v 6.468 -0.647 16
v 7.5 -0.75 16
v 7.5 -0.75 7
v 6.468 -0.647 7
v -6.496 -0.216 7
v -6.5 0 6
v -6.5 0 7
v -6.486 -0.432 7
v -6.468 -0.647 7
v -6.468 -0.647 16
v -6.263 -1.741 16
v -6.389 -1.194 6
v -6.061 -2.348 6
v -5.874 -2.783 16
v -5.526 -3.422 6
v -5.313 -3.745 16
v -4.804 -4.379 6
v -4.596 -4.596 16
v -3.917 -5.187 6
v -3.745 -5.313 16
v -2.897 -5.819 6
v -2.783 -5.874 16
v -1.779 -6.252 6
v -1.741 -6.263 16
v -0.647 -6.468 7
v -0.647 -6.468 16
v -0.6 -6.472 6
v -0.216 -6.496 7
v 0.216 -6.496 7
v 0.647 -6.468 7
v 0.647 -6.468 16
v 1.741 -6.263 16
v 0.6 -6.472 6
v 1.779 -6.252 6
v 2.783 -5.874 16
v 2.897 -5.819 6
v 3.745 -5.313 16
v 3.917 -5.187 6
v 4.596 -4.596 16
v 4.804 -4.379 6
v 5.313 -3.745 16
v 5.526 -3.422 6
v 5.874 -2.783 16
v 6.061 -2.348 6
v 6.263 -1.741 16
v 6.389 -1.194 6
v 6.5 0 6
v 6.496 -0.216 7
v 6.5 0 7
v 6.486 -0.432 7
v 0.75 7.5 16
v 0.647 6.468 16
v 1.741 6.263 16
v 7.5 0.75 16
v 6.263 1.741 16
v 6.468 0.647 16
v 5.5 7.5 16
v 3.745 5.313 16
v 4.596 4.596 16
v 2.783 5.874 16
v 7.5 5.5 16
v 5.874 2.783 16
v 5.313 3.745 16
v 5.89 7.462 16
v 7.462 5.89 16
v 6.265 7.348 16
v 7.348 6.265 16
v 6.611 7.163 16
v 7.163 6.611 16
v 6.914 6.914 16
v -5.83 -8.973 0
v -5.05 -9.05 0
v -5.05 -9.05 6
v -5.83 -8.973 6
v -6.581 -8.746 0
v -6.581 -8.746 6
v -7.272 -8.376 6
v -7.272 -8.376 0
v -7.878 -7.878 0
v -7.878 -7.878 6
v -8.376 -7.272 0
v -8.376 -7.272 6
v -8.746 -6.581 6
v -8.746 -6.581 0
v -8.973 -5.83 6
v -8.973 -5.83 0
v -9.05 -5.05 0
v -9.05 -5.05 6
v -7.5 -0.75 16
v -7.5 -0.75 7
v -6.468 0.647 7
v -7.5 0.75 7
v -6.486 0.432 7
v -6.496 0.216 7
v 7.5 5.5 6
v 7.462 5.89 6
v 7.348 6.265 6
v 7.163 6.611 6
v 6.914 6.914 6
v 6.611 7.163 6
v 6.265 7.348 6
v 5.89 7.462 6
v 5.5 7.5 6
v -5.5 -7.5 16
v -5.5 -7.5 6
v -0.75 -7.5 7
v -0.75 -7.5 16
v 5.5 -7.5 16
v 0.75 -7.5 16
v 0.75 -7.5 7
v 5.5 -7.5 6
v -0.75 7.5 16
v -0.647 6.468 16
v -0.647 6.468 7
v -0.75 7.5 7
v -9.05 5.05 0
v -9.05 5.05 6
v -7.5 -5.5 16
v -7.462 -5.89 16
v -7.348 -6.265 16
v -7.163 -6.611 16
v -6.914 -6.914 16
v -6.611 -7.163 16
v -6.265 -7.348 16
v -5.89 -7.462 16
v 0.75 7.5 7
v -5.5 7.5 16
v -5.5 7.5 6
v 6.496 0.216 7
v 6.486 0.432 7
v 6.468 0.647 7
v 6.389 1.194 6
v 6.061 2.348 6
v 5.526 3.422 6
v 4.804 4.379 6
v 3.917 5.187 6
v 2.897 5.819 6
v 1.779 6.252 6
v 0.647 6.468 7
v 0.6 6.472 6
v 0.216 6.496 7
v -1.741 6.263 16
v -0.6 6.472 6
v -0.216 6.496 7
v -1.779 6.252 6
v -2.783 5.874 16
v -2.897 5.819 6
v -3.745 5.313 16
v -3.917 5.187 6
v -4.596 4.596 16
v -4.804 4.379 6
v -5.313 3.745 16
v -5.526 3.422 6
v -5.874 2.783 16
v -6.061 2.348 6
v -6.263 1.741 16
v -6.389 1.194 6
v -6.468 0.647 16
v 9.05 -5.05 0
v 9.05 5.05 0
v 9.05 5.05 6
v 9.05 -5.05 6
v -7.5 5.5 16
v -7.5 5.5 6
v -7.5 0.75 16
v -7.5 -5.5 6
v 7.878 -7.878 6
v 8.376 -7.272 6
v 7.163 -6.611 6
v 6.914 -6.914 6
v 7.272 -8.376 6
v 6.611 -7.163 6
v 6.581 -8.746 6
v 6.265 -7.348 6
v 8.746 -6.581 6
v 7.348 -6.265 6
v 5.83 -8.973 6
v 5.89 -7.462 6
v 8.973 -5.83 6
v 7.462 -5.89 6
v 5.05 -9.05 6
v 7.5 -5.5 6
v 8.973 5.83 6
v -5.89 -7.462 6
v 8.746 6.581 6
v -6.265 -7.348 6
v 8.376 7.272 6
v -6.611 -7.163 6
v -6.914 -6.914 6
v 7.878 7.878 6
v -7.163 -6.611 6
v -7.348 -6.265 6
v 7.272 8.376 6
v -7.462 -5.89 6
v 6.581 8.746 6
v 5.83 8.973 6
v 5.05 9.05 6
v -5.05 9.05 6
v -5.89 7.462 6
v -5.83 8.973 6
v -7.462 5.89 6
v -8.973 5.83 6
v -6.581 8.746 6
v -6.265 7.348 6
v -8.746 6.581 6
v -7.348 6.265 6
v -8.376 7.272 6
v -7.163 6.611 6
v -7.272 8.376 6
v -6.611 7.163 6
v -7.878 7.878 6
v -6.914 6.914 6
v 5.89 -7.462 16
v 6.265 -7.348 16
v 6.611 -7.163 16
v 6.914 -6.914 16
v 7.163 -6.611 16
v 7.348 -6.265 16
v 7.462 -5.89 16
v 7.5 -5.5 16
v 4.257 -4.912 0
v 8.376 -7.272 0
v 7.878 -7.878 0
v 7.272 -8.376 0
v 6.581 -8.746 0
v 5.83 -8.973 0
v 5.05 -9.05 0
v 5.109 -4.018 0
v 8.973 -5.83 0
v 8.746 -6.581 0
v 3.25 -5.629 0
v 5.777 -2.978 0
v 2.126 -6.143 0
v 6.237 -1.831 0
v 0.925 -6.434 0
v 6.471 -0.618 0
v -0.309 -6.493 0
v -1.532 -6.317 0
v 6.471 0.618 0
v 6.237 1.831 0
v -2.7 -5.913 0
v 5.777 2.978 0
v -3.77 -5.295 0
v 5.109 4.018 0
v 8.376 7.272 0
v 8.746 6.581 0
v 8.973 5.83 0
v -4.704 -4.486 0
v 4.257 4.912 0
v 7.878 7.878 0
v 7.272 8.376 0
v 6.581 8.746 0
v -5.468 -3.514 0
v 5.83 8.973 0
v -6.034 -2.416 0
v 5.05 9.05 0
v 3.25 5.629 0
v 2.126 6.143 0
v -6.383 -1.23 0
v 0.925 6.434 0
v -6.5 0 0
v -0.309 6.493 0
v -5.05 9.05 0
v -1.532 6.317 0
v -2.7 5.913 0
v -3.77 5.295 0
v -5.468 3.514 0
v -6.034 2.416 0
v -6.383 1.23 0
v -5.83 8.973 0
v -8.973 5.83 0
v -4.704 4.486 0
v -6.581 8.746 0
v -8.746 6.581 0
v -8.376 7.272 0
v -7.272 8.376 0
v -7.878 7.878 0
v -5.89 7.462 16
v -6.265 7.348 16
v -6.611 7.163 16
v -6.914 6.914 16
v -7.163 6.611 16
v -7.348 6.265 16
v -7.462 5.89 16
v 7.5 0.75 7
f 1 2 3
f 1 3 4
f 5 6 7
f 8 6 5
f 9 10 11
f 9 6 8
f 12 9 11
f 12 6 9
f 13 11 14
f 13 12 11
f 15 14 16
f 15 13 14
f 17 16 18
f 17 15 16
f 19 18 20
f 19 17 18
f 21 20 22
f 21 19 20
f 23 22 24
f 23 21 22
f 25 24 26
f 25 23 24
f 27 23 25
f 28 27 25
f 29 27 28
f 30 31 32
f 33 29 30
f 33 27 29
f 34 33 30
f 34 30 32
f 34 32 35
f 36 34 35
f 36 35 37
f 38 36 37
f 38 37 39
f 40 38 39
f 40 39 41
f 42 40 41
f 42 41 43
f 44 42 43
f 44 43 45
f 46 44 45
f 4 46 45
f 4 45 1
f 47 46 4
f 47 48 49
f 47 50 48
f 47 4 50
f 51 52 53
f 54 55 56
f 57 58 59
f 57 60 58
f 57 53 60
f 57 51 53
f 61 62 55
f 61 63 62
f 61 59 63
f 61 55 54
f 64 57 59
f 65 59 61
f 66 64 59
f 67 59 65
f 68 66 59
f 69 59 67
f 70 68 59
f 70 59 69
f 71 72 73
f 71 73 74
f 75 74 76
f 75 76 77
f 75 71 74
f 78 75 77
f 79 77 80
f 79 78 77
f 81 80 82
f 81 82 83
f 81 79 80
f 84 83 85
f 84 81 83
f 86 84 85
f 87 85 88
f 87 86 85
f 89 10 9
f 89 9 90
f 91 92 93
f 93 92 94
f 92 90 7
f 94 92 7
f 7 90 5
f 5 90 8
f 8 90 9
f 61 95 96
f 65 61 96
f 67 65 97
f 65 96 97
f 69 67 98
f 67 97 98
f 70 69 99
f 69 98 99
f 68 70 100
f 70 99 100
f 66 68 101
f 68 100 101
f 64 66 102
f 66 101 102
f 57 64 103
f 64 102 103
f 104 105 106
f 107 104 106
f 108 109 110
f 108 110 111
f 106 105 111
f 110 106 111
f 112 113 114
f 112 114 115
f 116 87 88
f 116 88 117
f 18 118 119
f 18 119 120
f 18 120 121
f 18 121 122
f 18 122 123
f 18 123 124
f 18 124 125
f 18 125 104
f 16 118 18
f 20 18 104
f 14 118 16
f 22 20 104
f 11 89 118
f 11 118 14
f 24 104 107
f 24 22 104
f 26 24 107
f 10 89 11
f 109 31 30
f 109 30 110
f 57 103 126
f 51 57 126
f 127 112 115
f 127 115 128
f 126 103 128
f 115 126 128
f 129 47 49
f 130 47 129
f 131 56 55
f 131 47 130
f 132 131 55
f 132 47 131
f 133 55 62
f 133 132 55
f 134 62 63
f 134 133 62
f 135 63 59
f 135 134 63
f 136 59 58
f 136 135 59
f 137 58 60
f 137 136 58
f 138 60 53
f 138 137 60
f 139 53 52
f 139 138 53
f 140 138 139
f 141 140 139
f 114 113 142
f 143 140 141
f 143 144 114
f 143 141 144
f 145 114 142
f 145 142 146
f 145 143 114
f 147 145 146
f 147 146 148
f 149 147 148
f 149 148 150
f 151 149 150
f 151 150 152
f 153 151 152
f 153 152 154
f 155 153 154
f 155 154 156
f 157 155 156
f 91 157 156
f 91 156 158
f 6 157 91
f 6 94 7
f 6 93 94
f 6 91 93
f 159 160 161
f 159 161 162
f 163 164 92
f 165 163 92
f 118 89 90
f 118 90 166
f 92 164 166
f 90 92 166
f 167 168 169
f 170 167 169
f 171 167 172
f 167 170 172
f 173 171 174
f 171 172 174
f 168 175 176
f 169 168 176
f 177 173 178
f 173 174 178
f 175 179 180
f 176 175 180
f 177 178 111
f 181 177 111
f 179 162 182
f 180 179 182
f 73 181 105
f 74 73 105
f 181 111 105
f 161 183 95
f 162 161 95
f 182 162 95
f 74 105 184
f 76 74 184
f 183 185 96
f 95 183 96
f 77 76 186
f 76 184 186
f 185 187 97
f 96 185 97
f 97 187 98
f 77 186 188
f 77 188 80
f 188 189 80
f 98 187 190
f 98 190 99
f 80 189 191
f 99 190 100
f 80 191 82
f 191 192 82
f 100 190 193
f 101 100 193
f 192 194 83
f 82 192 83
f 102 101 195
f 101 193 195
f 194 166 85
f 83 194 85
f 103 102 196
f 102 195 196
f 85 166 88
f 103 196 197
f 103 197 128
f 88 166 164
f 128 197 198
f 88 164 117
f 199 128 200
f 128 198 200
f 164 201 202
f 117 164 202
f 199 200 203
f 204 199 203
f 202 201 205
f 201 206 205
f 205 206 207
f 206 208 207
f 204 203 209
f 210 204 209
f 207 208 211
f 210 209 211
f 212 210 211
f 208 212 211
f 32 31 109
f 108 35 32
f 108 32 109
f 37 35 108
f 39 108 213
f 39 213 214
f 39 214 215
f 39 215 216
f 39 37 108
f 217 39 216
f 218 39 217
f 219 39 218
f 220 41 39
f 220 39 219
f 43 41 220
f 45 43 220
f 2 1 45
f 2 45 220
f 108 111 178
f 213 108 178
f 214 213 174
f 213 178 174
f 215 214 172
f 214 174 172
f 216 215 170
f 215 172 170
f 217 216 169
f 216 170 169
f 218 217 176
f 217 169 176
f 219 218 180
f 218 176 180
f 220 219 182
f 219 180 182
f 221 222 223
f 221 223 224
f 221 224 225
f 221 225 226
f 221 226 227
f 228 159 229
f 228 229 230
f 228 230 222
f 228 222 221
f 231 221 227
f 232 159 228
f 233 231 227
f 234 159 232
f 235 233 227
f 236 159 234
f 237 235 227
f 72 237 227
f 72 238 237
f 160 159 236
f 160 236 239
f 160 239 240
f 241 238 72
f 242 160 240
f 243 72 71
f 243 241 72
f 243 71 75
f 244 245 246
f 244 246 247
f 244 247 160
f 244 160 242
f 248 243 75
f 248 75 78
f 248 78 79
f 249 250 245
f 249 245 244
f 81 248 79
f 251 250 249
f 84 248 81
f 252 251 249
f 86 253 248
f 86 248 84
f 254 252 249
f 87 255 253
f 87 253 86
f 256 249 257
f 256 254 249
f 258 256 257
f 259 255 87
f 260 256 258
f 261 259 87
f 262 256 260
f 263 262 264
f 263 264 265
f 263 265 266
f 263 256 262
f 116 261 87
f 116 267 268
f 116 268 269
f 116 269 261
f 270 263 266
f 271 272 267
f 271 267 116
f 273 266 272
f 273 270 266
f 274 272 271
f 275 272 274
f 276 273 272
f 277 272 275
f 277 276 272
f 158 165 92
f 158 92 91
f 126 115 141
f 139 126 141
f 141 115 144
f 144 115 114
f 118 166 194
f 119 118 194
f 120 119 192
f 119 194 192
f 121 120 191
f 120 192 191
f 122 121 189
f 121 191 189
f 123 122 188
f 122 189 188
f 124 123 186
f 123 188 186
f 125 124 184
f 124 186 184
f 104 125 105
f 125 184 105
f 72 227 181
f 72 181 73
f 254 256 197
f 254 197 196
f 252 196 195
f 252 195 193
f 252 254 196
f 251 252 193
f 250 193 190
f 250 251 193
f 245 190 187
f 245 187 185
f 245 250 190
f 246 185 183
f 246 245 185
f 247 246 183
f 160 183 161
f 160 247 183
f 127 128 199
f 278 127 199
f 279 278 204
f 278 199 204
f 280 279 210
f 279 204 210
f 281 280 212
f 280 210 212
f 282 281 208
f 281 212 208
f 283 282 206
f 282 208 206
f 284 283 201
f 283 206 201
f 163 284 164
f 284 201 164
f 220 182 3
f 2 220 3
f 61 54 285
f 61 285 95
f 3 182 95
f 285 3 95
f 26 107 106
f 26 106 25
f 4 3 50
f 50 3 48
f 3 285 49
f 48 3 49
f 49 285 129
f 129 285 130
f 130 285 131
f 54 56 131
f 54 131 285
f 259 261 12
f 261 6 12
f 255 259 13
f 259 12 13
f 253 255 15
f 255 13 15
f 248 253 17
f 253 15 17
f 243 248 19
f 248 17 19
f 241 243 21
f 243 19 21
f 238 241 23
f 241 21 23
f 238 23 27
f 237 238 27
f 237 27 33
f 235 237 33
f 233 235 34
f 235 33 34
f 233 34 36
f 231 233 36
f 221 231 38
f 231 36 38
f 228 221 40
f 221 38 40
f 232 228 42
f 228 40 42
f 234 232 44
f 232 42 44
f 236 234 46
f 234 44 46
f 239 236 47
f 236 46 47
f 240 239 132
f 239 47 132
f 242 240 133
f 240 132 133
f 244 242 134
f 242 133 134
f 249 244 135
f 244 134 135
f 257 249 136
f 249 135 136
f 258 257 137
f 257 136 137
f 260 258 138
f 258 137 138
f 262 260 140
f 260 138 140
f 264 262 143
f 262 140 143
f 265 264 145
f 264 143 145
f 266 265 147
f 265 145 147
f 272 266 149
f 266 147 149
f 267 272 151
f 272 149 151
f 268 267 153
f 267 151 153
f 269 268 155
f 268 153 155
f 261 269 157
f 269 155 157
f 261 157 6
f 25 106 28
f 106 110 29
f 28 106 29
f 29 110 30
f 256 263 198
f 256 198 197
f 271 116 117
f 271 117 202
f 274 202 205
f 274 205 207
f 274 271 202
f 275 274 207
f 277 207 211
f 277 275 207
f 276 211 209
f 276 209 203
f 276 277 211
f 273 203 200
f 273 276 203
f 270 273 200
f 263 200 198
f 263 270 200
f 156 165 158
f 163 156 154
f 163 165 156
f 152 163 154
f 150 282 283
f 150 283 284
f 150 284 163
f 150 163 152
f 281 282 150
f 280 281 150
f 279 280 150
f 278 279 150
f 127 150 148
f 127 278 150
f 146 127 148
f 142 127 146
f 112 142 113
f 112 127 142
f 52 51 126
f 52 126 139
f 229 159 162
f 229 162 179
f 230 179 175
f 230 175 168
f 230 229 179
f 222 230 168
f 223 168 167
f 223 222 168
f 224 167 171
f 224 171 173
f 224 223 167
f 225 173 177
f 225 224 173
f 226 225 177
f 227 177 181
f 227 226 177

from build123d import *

# Parameters (mm, degrees)
BOSS_EXTRUDE1_DEPTH = 6
SKETCH3_R           = 6.5
BOSS_EXTRUDE2_DEPTH = 10
CUT_EXTRUDE1_DEPTH  = 9
CIRPATTERN1_COUNT   = 4
SKETCH5_R           = 6.5
CUT_EXTRUDE2_DEPTH  = 30


with BuildPart() as part:
    # Sketch1 → Boss-Extrude1 (new body)
    with BuildSketch(Plane.XY):
        with BuildLine():
            Line((-5.05, 9.05), (5.05, 9.05))
            ThreePointArc((5.05, 9.05), (7.878427125, 7.878427125), (9.05, 5.05))
            Line((9.05, 5.05), (9.05, -5.05))
            ThreePointArc((9.05, -5.05), (7.878427125, -7.878427125), (5.05, -9.05))
            Line((5.05, -9.05), (-5.05, -9.05))
            ThreePointArc((-5.05, -9.05), (-7.878427125, -7.878427125), (-9.05, -5.05))
            Line((-9.05, -5.05), (-9.05, 5.05))
            ThreePointArc((-9.05, 5.05), (-7.878427125, 7.878427125), (-5.05, 9.05))
        make_face()
    extrude(amount=BOSS_EXTRUDE1_DEPTH)

    # Sketch3 → Boss-Extrude2 (add)
    with BuildSketch(Plane.XY.offset(6)):
        with BuildLine():
            Line((-5.5, -7.5), (5.5, -7.5))
            ThreePointArc((5.5, -7.5), (6.914213562, -6.914213562), (7.5, -5.5))
            Line((7.5, -5.5), (7.5, 5.5))
            ThreePointArc((7.5, 5.5), (6.914213562, 6.914213562), (5.5, 7.5))
            Line((5.5, 7.5), (-5.5, 7.5))
            ThreePointArc((-5.5, 7.5), (-6.914213562, 6.914213562), (-7.5, 5.5))
            Line((-7.5, 5.5), (-7.5, -5.5))
            ThreePointArc((-7.5, -5.5), (-6.914213562, -6.914213562), (-5.5, -7.5))
        make_face()
        Circle(SKETCH3_R, mode=Mode.SUBTRACT)
    extrude(amount=BOSS_EXTRUDE2_DEPTH)

    # Sketch4 → Cut-Extrude1 (cut)
    with BuildSketch(Plane.XY.offset(16)):
        Polygon((0, 0), (7.5, 0.75), (7.5, -0.75), align=None)
    cut_extrude1 = extrude(amount=-CUT_EXTRUDE1_DEPTH, mode=Mode.SUBTRACT)

    # CirPattern1: Cut-Extrude1 ×4 about axis
    cirpattern1_axis = Axis((0, 0, 16), (0, 0, -1))
    for i in range(1, CIRPATTERN1_COUNT):
        add(cut_extrude1.rotate(cirpattern1_axis, i * 360 / CIRPATTERN1_COUNT), mode=Mode.SUBTRACT)

    # Sketch5 → Cut-Extrude2 (cut, symmetric)
    with BuildSketch(Plane.XY):
        with Locations(Location((0, 0, 0), (0, 0, 180))):
            Circle(SKETCH5_R)
    extrude(amount=CUT_EXTRUDE2_DEPTH, both=True, mode=Mode.SUBTRACT)


solid = part.part
